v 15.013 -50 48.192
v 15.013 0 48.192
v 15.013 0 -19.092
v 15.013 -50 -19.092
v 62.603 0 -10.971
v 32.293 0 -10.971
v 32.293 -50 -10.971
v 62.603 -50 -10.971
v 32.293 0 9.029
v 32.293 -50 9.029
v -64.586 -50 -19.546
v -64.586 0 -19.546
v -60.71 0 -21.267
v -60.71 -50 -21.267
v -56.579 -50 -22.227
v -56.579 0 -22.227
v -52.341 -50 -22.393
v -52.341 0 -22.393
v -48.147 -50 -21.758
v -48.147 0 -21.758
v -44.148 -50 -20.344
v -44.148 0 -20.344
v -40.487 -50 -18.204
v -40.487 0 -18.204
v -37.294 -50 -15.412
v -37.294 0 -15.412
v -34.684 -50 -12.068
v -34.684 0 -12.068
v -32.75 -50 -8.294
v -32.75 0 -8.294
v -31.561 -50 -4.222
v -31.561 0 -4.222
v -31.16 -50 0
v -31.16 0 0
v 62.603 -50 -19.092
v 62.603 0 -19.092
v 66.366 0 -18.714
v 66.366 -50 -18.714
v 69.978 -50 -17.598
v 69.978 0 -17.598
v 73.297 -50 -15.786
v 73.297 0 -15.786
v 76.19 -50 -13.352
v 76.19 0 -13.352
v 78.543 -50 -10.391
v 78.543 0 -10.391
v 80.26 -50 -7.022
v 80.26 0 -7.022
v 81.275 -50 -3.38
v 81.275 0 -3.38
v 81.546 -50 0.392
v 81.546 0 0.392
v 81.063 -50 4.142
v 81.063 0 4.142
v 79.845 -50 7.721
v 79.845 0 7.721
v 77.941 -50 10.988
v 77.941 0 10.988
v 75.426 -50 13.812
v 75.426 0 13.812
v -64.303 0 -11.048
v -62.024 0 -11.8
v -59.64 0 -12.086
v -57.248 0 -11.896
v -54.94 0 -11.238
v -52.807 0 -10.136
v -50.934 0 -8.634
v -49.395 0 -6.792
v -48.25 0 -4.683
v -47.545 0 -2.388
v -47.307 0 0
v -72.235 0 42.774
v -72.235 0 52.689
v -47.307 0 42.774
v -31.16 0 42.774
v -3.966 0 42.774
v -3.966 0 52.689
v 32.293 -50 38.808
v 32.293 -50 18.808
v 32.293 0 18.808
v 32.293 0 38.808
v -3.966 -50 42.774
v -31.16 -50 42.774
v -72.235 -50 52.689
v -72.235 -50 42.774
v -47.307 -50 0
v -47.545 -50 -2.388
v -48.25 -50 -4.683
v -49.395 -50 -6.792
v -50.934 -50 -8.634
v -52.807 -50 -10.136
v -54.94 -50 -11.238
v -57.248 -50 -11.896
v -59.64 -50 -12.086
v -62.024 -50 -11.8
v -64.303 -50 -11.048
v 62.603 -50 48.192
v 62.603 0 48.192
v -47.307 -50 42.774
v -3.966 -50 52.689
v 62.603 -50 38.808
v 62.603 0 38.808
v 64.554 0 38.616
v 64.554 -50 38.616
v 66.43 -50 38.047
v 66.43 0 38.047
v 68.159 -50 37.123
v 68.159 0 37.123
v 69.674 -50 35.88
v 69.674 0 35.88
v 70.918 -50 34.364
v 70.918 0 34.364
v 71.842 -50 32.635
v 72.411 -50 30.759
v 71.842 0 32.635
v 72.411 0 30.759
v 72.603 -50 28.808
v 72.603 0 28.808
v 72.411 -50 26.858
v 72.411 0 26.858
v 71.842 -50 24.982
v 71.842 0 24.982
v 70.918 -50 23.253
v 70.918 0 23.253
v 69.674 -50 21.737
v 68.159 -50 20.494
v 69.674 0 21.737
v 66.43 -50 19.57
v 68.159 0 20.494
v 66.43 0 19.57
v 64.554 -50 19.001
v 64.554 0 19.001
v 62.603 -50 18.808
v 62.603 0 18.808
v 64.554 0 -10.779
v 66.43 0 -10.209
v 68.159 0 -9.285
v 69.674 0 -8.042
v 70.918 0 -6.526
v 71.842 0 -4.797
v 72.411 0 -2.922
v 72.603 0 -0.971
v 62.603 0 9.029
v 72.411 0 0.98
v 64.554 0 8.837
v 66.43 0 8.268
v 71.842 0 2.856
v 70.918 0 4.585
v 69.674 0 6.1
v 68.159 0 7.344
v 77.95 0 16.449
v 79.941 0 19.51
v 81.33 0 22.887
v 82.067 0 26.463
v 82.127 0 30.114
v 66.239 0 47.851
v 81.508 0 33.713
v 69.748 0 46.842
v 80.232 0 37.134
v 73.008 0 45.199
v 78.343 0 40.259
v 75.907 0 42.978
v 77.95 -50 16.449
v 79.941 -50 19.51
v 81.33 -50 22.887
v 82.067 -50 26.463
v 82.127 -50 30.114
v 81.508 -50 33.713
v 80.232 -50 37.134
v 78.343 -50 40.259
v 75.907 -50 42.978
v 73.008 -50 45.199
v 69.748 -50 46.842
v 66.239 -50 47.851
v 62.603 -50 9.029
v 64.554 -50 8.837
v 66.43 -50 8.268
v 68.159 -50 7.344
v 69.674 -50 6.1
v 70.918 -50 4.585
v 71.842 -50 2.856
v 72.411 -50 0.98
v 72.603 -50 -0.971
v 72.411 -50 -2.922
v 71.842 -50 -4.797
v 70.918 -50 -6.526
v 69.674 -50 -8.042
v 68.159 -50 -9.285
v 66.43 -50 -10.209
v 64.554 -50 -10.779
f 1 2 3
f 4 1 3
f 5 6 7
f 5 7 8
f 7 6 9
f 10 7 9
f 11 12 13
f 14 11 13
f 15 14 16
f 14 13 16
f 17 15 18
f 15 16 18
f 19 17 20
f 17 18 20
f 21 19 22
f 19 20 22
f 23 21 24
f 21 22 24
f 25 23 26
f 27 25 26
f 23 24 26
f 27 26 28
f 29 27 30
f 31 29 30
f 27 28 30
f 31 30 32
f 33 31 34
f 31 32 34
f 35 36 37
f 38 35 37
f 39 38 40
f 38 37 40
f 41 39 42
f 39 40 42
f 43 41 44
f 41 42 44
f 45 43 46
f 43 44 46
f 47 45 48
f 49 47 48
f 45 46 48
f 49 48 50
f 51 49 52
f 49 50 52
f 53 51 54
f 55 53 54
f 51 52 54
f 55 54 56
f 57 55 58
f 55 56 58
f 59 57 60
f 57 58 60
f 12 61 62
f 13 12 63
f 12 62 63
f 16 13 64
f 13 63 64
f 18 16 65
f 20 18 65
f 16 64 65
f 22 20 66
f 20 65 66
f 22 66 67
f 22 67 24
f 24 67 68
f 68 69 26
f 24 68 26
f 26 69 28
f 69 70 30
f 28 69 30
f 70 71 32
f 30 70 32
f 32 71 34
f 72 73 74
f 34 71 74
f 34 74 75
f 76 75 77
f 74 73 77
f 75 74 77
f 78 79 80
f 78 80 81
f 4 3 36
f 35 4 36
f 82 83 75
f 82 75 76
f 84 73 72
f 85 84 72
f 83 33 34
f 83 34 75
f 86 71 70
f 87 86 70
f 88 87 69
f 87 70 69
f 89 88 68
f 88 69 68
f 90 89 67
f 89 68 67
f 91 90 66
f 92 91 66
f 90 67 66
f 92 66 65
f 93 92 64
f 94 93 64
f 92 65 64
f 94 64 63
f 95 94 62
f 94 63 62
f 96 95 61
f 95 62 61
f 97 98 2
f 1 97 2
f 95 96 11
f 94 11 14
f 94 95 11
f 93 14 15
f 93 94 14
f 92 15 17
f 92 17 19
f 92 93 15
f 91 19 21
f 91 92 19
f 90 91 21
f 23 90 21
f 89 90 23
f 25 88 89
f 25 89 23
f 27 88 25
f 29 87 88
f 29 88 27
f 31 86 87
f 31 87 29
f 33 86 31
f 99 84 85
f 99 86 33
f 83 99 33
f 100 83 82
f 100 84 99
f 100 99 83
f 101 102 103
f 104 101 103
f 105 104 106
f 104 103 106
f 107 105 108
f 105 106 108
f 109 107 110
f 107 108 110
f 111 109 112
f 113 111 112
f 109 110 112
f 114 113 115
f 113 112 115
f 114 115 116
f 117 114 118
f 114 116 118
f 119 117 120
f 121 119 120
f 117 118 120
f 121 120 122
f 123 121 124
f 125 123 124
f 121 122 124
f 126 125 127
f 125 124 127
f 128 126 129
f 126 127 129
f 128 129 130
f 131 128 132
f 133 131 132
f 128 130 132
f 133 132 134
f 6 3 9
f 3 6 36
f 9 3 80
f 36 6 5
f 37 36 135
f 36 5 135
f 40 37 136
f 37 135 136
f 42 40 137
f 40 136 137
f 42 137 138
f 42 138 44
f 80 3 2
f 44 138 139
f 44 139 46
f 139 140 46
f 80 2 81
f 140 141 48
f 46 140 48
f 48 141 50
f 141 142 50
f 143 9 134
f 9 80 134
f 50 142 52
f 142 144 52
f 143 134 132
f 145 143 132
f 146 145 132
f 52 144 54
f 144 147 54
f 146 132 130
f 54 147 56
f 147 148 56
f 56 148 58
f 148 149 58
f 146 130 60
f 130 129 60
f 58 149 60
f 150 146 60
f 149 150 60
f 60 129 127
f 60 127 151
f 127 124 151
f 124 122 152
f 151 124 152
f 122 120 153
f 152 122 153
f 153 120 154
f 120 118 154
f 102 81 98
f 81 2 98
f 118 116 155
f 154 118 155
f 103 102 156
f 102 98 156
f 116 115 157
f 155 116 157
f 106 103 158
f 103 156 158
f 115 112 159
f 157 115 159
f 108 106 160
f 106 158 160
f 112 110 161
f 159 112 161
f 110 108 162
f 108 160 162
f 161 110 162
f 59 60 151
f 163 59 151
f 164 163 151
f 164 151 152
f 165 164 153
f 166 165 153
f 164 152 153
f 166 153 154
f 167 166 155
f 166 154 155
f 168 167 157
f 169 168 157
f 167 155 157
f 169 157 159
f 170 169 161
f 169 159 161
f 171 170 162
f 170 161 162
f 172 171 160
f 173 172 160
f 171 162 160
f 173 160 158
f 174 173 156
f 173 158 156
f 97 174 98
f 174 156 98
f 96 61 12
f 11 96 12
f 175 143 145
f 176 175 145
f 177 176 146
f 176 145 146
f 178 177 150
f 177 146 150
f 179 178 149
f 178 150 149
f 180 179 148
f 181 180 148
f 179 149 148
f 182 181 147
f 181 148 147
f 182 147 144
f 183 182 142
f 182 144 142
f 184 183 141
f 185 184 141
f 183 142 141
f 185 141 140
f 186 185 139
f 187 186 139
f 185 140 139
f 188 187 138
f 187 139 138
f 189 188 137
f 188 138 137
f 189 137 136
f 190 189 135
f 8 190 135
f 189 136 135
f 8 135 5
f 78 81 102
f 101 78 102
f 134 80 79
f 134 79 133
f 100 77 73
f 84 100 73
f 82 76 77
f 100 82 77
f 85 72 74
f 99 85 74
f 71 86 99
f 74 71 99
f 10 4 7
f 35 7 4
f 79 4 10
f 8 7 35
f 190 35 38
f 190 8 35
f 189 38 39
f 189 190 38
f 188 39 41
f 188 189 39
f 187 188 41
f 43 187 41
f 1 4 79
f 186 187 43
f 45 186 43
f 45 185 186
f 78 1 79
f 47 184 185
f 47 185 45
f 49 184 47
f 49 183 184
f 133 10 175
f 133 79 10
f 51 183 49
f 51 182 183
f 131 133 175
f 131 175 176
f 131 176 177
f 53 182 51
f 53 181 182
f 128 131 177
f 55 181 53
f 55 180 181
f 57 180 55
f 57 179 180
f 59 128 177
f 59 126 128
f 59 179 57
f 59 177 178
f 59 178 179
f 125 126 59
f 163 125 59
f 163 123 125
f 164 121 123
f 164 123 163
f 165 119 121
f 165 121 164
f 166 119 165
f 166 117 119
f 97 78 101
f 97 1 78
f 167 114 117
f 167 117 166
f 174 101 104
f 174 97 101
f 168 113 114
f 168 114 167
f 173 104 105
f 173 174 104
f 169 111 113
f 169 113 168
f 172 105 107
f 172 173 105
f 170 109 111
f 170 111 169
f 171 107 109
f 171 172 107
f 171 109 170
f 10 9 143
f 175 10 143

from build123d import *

# Parameters (mm, degrees)
F1_W     = 30.3102508187
F1_H     = 9.3834362134
F1_H_2   = 8.121065446
F1_H_3   = 9.7791151471
F2_DEPTH = 50
F0_W     = 16.1465834826
F0_H     = 42.7742786705


with BuildPart() as f2:
    # F1 (on Front) → F2 (new body)
    with BuildSketch(Plane.XZ):
        Polygon((32.2931706905, 48.1918900415), (15.0134908035, 48.1918900415), (15.0134908035, -19.091726765), (32.2931706905, -19.091726765), (32.2931706905, -10.970661319), (32.2931706905, 9.029338681), (32.2931706905, 18.8084538281), (32.2931706905, 38.8084538281), align=None)
        with Locations((47.4482960999, 43.5001719348)):
            Rectangle(F1_W, F1_H)
        with Locations((47.4482960999, -15.031194042)):
            Rectangle(F1_W, F1_H_2)
        with Locations((47.4482960999, 13.9188962546)):
            Rectangle(F1_W, F1_H_3)
        with BuildLine():
            ThreePointArc((62.6034215093, 9.029338681), (69.4460070683, 10.2638059158), (75.4258349795, 13.8115579703))
            ThreePointArc((75.4258349795, 13.8115579703), (69.4842509545, 17.5150933645), (62.6034215093, 18.8084538281))
            Line((62.6034215093, 18.8084538281), (62.6034215093, 9.029338681))
        make_face()
        with BuildLine():
            ThreePointArc((62.6034215093, -19.091726765), (80.2601513422, -7.0224659137), (75.4258349795, 13.8115579703))
            ThreePointArc((75.4258349795, 13.8115579703), (69.4460070683, 10.2638059158), (62.6034215093, 9.029338681))
            ThreePointArc((62.6034215093, 9.029338681), (72.6034215093, -0.970661319), (62.6034215093, -10.970661319))
            Line((62.6034215093, -10.970661319), (62.6034215093, -19.091726765))
        make_face()
        with BuildLine():
            ThreePointArc((75.4258349795, 13.8115579703), (80.9502299547, 35.4531999203), (62.6034215093, 48.1918900415))
            Line((62.6034215093, 48.1918900415), (62.6034215093, 38.8084538281))
            ThreePointArc((62.6034215093, 38.8084538281), (72.6034215093, 28.8084538281), (62.6034215093, 18.8084538281))
            ThreePointArc((62.6034215093, 18.8084538281), (69.4842509545, 17.5150933645), (75.4258349795, 13.8115579703))
        make_face()
    extrude(amount=F2_DEPTH)


with BuildPart() as f2b:
    # F0 (on Front) → F2, piece 2 (new body)
    with BuildSketch(Plane.XZ):
        with Locations((-39.2333650962, 21.3871393353)):
            Rectangle(F0_W, F0_H)
        with BuildLine():
            Line((-31.1600733548, 0), (-47.3066568375, 0))
            ThreePointArc((-47.3066568375, 0), (-52.8071535408, -10.1356876731), (-64.3030628562, -11.0476622358))
            Line((-64.3030628562, -11.0476622358), (-64.5863339305, -19.5458643138))
            ThreePointArc((-64.5863339305, -19.5458643138), (-42.2667634376, -19.3607573964), (-31.1600733548, 0))
        make_face()
        Polygon((-3.9658276364, 52.6888519526), (-72.2347125411, 52.6888519526), (-72.2347125411, 42.7742786705), (-47.3066568375, 42.7742786705), (-31.1600733548, 42.7742786705), (-3.9658276364, 42.7742786705), align=None)
    extrude(amount=F2_DEPTH)


solid = Compound([f2.part, f2b.part])
